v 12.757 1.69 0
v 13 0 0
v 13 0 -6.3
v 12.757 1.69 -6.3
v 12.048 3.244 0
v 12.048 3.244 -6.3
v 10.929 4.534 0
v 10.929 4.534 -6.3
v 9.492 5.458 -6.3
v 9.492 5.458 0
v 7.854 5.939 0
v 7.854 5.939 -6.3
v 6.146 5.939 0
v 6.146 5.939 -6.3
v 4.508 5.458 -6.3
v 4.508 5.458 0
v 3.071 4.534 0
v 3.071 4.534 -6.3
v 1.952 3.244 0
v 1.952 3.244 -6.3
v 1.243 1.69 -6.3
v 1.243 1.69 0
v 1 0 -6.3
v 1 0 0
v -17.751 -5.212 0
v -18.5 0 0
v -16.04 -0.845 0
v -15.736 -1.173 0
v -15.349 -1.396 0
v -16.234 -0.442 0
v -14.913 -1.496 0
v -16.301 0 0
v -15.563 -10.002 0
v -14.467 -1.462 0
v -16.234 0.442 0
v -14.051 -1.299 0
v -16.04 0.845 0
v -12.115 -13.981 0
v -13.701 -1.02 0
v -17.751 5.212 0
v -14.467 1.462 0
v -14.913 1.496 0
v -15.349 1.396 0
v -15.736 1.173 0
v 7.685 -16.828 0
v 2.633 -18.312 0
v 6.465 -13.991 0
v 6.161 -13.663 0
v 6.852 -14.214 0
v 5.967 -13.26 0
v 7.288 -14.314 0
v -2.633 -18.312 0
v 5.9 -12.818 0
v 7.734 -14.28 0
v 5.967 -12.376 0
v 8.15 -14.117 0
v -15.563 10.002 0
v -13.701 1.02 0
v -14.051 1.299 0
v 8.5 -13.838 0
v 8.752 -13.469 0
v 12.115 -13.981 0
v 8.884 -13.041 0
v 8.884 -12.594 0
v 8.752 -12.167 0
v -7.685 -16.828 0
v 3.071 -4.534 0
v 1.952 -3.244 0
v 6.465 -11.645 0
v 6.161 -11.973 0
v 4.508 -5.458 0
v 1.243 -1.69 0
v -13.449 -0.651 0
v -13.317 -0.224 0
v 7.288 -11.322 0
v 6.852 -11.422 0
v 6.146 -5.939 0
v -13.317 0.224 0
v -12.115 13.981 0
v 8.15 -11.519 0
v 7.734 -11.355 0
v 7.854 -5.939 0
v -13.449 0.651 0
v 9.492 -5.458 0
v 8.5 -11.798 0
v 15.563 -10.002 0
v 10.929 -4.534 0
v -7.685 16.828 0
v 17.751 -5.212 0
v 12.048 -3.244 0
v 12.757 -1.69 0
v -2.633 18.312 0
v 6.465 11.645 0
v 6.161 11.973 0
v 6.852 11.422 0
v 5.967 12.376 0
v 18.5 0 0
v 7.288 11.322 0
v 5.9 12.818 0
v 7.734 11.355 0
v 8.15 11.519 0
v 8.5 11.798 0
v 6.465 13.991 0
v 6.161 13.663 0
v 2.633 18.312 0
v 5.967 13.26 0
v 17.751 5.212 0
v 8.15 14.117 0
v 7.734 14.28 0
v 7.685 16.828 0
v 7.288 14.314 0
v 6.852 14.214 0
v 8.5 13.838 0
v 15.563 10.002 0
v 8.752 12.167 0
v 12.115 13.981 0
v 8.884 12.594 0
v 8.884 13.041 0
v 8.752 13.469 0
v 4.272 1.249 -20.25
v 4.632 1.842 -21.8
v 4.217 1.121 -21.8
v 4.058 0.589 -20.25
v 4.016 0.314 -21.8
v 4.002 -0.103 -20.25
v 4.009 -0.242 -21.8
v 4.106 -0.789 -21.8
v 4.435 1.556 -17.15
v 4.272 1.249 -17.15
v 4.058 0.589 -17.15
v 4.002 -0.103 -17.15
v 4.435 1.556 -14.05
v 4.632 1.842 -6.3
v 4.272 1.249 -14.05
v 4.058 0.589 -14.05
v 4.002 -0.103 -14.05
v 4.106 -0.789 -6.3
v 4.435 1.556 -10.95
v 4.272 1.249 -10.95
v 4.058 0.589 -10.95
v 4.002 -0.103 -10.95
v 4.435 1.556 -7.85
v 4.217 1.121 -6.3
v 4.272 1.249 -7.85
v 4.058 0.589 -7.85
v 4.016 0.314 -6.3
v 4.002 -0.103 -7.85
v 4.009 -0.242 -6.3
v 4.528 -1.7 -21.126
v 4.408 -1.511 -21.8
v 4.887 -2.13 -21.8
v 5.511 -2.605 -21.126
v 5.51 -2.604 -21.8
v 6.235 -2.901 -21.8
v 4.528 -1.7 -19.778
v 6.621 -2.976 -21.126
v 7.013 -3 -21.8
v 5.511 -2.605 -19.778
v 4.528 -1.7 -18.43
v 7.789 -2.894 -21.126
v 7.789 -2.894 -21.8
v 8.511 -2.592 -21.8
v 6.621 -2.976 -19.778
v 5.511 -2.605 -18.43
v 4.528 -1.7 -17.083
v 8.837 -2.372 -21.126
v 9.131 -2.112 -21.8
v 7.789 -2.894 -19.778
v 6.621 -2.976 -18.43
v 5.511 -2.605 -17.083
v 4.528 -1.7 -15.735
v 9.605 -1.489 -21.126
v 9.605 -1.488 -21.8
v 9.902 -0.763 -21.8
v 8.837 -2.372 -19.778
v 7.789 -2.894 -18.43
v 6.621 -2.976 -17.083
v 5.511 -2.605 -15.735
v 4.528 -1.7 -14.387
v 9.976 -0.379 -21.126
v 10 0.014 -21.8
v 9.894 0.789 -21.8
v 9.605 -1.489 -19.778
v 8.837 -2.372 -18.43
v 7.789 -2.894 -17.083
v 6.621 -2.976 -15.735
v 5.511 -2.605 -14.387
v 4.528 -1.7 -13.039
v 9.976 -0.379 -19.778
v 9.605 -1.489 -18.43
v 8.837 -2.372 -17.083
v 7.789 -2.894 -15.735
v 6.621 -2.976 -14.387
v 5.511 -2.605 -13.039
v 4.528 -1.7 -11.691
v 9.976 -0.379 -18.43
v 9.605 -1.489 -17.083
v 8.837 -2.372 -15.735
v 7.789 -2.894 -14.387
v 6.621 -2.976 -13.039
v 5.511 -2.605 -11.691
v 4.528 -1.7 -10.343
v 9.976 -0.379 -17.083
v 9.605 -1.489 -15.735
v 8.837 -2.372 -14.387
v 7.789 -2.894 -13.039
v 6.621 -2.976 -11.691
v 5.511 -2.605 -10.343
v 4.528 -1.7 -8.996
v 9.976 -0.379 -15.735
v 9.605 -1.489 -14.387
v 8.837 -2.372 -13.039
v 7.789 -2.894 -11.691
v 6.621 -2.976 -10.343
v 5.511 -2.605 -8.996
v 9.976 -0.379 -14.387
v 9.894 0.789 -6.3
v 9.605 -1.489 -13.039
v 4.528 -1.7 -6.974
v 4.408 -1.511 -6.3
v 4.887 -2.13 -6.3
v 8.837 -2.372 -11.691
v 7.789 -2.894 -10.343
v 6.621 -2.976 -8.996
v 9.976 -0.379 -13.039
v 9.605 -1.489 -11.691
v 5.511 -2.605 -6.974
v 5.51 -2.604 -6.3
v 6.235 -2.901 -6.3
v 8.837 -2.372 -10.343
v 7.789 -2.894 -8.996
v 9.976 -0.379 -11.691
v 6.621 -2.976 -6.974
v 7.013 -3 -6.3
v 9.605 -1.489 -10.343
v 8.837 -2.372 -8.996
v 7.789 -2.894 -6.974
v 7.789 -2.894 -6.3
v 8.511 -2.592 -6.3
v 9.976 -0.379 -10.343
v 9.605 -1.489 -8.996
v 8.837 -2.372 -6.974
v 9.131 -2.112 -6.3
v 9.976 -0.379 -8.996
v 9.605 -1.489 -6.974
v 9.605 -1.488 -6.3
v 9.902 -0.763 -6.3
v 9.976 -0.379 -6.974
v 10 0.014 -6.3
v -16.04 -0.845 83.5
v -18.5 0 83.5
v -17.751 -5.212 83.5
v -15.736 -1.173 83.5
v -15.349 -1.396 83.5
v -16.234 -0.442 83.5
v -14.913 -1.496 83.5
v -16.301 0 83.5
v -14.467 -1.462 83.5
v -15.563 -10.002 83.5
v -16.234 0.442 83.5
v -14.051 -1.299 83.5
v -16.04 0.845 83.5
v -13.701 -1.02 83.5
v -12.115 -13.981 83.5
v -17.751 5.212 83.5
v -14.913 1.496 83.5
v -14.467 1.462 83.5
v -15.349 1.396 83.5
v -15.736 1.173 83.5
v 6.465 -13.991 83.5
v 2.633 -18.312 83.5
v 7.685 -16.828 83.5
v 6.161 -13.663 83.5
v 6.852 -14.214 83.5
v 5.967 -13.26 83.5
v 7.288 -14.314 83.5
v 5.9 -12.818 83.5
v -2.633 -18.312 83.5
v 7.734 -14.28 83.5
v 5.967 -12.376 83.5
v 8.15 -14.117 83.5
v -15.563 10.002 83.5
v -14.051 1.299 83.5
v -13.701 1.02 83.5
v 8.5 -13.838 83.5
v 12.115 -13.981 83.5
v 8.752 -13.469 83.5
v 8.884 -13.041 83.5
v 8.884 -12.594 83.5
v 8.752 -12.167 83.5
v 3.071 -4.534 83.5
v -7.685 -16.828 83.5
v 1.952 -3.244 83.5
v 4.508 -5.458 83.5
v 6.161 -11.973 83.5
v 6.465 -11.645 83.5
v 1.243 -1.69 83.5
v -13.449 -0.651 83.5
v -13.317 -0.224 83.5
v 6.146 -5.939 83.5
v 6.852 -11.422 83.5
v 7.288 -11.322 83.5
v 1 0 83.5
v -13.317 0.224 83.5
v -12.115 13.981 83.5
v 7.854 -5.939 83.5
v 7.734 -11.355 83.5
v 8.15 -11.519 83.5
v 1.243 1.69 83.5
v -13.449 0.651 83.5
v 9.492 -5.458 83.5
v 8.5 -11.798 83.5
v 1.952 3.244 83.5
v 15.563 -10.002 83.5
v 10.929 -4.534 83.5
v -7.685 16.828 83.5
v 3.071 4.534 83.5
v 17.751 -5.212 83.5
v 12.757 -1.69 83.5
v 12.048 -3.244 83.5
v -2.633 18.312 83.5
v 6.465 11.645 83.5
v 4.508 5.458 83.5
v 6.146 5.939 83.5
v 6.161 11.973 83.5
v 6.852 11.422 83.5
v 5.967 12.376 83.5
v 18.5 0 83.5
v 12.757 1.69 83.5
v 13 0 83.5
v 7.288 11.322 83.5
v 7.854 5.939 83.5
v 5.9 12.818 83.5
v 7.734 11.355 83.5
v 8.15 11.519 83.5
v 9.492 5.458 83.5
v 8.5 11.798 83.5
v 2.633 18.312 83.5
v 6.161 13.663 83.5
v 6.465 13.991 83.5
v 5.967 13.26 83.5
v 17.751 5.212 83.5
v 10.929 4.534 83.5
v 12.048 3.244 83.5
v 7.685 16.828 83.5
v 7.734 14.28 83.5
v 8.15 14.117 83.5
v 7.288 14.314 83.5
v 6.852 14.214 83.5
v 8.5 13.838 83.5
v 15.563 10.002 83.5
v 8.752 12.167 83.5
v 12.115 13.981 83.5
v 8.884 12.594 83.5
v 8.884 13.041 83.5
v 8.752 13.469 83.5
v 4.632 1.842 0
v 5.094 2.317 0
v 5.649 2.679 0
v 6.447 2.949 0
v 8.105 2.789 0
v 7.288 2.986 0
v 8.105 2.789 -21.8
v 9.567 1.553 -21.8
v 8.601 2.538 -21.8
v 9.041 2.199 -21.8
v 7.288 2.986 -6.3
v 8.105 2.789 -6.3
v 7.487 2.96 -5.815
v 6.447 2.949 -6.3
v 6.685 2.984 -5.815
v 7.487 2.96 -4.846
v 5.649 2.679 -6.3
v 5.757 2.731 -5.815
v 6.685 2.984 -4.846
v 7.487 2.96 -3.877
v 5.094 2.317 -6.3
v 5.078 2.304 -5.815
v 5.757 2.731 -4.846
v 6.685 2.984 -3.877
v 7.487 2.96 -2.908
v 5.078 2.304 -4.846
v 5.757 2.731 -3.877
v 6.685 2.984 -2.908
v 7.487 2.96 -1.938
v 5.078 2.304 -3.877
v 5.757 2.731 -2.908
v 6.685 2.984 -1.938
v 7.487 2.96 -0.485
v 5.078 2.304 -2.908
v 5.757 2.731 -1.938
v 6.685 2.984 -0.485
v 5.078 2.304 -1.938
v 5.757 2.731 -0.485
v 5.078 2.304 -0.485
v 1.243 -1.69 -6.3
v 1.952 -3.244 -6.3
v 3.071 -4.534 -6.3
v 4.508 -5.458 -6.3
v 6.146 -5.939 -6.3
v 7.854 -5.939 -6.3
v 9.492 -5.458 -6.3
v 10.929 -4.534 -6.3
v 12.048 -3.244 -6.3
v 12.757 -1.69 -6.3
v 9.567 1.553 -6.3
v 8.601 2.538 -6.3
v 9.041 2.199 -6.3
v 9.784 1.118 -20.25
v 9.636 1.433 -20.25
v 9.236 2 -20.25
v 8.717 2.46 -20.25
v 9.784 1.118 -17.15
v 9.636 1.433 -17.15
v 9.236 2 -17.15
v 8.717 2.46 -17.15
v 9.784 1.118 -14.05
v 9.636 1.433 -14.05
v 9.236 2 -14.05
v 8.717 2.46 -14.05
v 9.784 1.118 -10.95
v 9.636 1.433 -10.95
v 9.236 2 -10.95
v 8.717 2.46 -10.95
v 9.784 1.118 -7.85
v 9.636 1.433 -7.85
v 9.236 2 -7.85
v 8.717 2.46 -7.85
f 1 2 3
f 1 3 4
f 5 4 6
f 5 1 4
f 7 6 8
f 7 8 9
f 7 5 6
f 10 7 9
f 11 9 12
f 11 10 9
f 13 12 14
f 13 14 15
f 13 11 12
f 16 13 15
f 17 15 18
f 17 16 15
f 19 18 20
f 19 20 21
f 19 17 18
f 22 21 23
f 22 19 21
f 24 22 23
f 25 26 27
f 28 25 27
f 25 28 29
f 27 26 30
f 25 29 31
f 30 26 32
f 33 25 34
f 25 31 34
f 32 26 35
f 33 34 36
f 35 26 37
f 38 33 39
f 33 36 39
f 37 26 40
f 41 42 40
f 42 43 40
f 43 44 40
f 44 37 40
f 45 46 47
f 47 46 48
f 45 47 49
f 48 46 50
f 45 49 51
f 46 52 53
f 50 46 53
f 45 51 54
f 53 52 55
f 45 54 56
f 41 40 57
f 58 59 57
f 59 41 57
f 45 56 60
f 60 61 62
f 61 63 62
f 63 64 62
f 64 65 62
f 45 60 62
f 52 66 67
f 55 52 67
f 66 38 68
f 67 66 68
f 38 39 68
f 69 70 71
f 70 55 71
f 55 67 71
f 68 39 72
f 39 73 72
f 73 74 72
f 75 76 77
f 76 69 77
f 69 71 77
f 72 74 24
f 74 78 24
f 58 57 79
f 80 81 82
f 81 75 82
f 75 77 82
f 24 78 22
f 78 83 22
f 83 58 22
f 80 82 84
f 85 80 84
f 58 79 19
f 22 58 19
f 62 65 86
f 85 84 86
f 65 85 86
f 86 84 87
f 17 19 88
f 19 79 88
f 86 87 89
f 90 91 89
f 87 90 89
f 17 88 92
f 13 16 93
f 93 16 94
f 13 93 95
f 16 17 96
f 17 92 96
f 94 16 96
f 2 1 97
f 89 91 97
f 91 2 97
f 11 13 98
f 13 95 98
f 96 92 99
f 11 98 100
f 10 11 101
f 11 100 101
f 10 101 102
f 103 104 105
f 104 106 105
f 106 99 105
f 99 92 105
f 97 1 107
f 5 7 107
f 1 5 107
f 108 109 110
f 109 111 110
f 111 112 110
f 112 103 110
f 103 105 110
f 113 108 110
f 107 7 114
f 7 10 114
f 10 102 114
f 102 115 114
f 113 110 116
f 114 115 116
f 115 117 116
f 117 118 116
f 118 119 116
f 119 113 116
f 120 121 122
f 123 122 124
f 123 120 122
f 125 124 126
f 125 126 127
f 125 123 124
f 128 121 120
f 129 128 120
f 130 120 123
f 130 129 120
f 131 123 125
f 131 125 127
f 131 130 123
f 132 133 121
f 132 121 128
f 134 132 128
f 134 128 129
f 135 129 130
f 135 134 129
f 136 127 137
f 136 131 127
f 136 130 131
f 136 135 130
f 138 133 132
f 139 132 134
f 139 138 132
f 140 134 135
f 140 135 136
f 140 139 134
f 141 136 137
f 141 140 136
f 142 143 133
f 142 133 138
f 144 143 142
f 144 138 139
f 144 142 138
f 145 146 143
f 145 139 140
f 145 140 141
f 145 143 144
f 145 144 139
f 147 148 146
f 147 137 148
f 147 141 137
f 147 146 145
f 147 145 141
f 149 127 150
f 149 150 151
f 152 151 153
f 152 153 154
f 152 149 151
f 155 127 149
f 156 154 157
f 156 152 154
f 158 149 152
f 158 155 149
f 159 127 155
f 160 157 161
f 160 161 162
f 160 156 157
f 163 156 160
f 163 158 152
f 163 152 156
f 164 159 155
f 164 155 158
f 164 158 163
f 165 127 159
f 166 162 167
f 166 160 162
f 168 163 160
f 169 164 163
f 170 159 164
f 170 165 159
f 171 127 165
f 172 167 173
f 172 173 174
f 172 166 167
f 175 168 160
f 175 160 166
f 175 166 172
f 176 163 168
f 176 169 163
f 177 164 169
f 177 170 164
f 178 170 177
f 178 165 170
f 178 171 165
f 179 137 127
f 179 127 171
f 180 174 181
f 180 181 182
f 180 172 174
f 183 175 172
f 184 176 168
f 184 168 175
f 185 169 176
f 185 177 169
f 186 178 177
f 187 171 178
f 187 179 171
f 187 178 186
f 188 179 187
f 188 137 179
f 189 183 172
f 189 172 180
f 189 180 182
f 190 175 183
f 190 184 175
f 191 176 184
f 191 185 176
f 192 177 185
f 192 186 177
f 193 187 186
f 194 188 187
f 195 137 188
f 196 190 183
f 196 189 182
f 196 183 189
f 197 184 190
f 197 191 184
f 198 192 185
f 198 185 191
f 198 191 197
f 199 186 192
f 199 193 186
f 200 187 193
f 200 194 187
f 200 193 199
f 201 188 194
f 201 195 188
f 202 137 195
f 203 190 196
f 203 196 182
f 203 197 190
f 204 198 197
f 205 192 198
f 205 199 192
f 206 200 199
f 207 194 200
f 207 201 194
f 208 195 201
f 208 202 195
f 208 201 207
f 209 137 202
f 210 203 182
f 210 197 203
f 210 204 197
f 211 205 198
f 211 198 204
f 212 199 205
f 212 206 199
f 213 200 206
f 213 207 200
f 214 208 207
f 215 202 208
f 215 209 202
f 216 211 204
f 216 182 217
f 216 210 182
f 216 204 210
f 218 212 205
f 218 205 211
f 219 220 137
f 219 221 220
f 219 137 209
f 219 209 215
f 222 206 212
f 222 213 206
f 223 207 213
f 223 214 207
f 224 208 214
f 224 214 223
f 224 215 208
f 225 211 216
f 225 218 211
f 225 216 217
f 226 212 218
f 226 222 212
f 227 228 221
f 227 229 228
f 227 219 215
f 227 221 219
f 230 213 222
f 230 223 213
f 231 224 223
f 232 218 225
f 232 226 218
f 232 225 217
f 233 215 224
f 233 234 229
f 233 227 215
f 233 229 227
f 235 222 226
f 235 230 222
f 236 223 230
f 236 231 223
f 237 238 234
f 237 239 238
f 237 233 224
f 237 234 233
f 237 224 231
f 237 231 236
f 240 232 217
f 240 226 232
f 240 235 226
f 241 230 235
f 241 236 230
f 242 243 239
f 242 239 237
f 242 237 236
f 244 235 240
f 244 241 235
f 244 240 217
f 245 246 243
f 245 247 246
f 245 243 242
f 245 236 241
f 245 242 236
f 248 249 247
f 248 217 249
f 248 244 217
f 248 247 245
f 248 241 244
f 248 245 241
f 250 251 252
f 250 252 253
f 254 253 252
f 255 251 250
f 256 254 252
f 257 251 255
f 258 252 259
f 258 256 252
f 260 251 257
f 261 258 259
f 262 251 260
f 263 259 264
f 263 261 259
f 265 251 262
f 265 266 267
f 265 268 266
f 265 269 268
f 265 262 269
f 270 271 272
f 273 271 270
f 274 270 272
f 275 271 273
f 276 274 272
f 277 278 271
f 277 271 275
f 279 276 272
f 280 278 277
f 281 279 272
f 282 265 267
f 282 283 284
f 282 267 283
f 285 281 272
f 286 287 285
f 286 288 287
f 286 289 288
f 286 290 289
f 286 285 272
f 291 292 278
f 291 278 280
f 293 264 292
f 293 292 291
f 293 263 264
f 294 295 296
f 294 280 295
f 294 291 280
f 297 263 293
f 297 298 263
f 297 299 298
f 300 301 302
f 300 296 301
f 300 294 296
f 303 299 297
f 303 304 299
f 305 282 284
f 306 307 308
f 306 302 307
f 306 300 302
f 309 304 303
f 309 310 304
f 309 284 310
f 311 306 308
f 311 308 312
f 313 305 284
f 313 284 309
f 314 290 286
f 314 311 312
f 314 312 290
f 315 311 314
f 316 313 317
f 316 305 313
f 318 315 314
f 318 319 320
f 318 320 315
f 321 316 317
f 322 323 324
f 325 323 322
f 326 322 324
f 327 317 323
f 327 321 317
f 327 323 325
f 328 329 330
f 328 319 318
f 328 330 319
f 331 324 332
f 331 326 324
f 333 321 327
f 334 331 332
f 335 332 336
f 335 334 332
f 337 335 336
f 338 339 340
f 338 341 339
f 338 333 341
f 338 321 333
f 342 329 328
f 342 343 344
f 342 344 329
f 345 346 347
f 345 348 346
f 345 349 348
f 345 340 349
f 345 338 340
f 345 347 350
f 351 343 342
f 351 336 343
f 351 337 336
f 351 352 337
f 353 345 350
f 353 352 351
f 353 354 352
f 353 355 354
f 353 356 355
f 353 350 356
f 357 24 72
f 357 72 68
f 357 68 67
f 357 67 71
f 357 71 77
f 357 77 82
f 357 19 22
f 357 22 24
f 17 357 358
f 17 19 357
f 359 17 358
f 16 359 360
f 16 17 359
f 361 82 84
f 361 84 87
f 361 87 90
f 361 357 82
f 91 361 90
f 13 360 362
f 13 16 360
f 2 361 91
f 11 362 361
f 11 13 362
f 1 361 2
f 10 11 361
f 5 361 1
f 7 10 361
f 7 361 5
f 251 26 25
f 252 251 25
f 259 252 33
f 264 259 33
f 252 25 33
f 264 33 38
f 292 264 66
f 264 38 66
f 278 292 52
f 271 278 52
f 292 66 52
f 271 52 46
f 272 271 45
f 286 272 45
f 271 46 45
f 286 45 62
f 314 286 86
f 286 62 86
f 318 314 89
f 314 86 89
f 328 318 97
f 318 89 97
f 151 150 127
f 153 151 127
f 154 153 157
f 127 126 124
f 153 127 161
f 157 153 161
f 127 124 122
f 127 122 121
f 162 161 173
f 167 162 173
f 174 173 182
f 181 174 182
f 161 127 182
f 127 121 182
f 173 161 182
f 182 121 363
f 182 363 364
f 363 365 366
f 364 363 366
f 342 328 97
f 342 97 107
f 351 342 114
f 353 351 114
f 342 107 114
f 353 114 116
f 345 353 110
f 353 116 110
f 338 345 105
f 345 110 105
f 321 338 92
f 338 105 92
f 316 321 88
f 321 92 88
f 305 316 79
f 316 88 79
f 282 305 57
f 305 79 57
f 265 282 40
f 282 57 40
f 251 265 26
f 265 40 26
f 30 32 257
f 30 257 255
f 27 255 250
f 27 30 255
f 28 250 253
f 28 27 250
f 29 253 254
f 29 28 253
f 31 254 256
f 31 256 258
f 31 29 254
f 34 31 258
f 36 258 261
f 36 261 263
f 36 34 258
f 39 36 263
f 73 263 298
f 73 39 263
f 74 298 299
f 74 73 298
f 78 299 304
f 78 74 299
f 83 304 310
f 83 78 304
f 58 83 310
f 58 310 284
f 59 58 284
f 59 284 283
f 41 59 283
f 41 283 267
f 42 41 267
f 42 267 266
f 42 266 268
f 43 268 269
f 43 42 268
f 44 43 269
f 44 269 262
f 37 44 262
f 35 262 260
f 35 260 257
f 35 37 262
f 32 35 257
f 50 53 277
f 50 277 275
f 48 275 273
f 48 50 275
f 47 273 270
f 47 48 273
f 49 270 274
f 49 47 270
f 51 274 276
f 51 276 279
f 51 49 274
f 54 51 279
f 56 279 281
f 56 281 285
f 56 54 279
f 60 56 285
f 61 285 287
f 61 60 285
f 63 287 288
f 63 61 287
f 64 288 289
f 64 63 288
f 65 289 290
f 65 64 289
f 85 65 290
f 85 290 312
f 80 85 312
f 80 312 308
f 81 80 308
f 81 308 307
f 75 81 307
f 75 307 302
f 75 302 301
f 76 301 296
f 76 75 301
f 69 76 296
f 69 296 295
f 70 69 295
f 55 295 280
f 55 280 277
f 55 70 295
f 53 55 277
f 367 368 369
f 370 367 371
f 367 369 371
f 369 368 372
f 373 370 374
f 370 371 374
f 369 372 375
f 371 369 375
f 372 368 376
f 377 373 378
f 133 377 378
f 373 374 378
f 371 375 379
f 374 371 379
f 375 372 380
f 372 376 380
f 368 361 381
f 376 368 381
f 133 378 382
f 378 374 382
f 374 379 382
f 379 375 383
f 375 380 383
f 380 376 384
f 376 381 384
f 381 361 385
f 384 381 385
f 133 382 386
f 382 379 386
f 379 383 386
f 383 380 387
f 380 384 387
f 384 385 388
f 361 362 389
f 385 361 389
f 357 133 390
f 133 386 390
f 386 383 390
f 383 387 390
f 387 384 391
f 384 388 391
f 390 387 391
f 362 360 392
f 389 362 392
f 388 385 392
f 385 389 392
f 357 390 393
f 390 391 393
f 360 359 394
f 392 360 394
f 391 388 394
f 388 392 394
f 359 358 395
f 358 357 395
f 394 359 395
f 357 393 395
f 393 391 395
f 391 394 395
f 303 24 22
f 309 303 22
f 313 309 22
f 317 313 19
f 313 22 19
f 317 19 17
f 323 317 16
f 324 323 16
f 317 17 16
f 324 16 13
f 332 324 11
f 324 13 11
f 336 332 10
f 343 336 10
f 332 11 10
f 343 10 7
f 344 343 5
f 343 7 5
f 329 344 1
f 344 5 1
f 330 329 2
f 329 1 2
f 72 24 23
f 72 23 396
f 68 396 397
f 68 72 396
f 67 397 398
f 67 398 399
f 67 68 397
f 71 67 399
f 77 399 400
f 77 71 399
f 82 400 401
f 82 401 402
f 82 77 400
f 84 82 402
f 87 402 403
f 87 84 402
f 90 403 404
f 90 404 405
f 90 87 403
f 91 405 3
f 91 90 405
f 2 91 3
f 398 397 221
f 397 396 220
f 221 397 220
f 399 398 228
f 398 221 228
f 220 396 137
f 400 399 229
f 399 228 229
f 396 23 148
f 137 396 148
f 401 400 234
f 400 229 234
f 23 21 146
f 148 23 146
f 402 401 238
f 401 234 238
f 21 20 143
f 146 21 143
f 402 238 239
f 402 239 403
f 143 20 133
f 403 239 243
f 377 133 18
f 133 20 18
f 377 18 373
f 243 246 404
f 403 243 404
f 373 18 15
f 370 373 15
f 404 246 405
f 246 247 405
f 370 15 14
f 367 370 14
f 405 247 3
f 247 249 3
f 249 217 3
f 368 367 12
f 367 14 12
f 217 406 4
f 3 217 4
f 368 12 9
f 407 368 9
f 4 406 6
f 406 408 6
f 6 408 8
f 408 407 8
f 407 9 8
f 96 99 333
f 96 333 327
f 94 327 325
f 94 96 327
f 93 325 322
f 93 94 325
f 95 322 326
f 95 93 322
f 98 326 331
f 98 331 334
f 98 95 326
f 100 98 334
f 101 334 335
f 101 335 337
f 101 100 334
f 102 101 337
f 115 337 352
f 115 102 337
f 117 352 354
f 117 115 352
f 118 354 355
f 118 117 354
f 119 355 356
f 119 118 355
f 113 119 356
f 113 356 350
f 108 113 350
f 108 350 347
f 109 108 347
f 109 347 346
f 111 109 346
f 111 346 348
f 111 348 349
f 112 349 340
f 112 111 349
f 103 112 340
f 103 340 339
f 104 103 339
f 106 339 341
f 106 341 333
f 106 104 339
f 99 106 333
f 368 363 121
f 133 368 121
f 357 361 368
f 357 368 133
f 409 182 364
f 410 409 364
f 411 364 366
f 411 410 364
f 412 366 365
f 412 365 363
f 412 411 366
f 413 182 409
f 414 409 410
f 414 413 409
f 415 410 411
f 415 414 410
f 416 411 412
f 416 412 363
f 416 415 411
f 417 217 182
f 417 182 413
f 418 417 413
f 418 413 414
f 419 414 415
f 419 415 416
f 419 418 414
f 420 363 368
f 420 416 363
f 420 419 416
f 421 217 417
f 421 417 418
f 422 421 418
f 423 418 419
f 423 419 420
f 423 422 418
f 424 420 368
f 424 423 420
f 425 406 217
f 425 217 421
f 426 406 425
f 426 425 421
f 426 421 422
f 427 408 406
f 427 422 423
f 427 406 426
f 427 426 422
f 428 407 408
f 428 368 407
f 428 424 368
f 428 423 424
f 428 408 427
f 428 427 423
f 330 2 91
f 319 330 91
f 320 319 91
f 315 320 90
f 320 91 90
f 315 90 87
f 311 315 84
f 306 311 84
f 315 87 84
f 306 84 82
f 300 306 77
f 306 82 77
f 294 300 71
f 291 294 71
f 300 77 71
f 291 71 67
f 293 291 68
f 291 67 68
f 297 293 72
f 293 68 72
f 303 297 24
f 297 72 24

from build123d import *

# Parameters (mm, degrees)
SKETCH1_R           = 1.5
BOSS_EXTRUDE1_DEPTH = 83.5
BOSS_EXTRUDE2_DEPTH = 6.3
BOSS_EXTRUDE3_DEPTH = 21.8


with BuildPart() as part:
    # Sketch1 → Boss-Extrude1 (new body)
    with BuildSketch(Plane.XY):
        with BuildLine():
            ThreePointArc((-18.5, -1e-09), (-1e-09, -18.500000001), (18.5, -4e-09))
            ThreePointArc((18.5, -4e-09), (1e-09, 18.499999998), (-18.5, -1e-09))
        make_face()
        with Locations(Location((7.400368446, -12.817814144, 0), (0, 0, 180))):
            Circle(SKETCH1_R, mode=Mode.SUBTRACT)
        with Locations(Location((-14.800736893, 0, 0), (0, 0, 180))):
            Circle(SKETCH1_R, mode=Mode.SUBTRACT)
        with BuildLine():
            ThreePointArc((13, -1e-09), (7, -6.000000001), (1, 0))
            ThreePointArc((1, 0), (7, 6), (13, -1e-09))
        make_face(mode=Mode.SUBTRACT)
        with Locations(Location((7.400368446, 12.817814144, 0), (0, 0, 180))):
            Circle(SKETCH1_R, mode=Mode.SUBTRACT)
    extrude(amount=BOSS_EXTRUDE1_DEPTH)


with BuildPart() as body_2:
    # Sketch1<4> → Boss-Extrude2 (new body)
    with BuildSketch(Plane.XY):
        with BuildLine():
            ThreePointArc((1, 0), (7, -6.000000001), (13, -1e-09))
            ThreePointArc((13, -1e-09), (7, 6), (1, 0))
        make_face()
        with BuildLine():
            add(Edge.make_bspline(
                [(8.10541894, 2.788921407), (8.05500552, 2.808017036), (7.954470645, 2.846097703), (7.800382794, 2.892843221), (7.644653105, 2.931666611), (7.487006952, 2.961856664), (7.327509508, 2.983596312), (7.060252278, 3.005571873), (6.68327869, 2.996823324), (6.207659642, 2.906637249), (5.752071024, 2.74292972), (5.375767864, 2.533132351), (5.075145817, 2.308378785), (4.837518217, 2.090132072), (4.700743618, 1.92494138), (4.632152753, 1.842100177)],
                knots=[0, 0, 0, 0, 0.041904133, 0.083565582, 0.125104396, 0.166641686, 0.208298579, 0.250195161, 0.375077662, 0.500044869, 0.624999105, 0.749894577, 0.833412578, 0.916458353, 1, 1, 1, 1], degree=3))
            add(Edge.make_bspline(
                [(4.632152753, 1.842100177), (4.597269985, 1.795687752), (4.527611903, 1.703024503), (4.433602806, 1.556735275), (4.347690797, 1.405616278), (4.245209228, 1.197641534), (4.139602727, 0.927062319), (4.05183773, 0.590024289), (4.003020314, 0.245060768), (3.995573118, -0.103006397), (4.02527969, -0.45047126), (4.078837212, -0.676165232), (4.105616921, -0.789016216)],
                knots=[0, 0, 0, 0, 0.062621871, 0.125034978, 0.187450303, 0.250078802, 0.375056772, 0.500052515, 0.625030485, 0.750026228, 0.875008686, 1, 1, 1, 1], degree=3))
            add(Edge.make_bspline(
                [(4.105616921, -0.789016216), (4.121346898, -0.843341546), (4.152683127, -0.95156491), (4.210842998, -1.109818013), (4.276905688, -1.263998492), (4.351672036, -1.413884276), (4.434920833, -1.559525946), (4.526726784, -1.700914361), (4.708992899, -1.950135671), (5.018399378, -2.279613745), (5.50192427, -2.620834329), (6.041515585, -2.864347025), (6.618933709, -2.994641949), (7.210607239, -3.013102901), (7.793942299, -2.912517343), (8.347639904, -2.703148265), (8.848078854, -2.386985144), (9.279508614, -1.981669651), (9.620855698, -1.498035987), (9.864366677, -0.958574348), (9.972979397, -0.476459302), (10.004050984, -0.084821691), (9.997819621, 0.209477257), (9.964166275, 0.502224345), (9.91771995, 0.693107384), (9.894383079, 0.789016217)],
                knots=[0, 0, 0, 0, 0.018019158, 0.035896586, 0.053688522, 0.071452014, 0.089244387, 0.107122684, 0.125143136, 0.187619424, 0.250101049, 0.312577337, 0.375058963, 0.437535251, 0.500016876, 0.562493163, 0.62497479, 0.687451077, 0.749932704, 0.812408993, 0.874890617, 0.906319787, 0.93744398, 0.968568842, 1, 1, 1, 1], degree=3))
            add(Edge.make_bspline(
                [(9.894383079, 0.789016217), (9.87818821, 0.844771359), (9.84585246, 0.956095774), (9.785226535, 1.119076588), (9.715878542, 1.278477594), (9.610987687, 1.485247696), (9.457888215, 1.732080426), (9.240916793, 2.004515242), (8.994236429, 2.250547291), (8.720251014, 2.465345345), (8.42445518, 2.650059005), (8.211765489, 2.742629371), (8.10541894, 2.788921407)],
                knots=[0, 0, 0, 0, 0.06262187, 0.125034977, 0.187450302, 0.250078803, 0.375056772, 0.500052515, 0.625030484, 0.750026228, 0.875008685, 1, 1, 1, 1], degree=3))
        make_face(mode=Mode.SUBTRACT)
    extrude(amount=-BOSS_EXTRUDE2_DEPTH)


with BuildPart() as boss_extrude3_tool:
    # Sketch1<5> → Boss-Extrude3 (new body)
    with BuildSketch(Plane.XY):
        with BuildLine():
            Line((8.105416875, 2.788916194), (4.632157178, 1.842096733))
            add(Edge.make_bspline(
                [(4.632157178, 1.842096733), (4.597269985, 1.795687752), (4.527611903, 1.703024503), (4.433602806, 1.556735275), (4.347690797, 1.405616278), (4.245209228, 1.197641534), (4.139602727, 0.927062319), (4.05183773, 0.590024289), (4.003020314, 0.245060768), (3.995573118, -0.103006397), (4.02527969, -0.45047126), (4.078837212, -0.676165232), (4.105616921, -0.789016216)],
                knots=[0, 0, 0, 0, 0.062621871, 0.125034978, 0.187450303, 0.250078802, 0.375056772, 0.500052515, 0.625030485, 0.750026228, 0.875008686, 1, 1, 1, 1], degree=3))
            add(Edge.make_bspline(
                [(4.105616921, -0.789016216), (4.121346898, -0.843341546), (4.152683127, -0.95156491), (4.210842998, -1.109818013), (4.276905688, -1.263998492), (4.351672036, -1.413884276), (4.434920833, -1.559525946), (4.526726784, -1.700914361), (4.708992899, -1.950135671), (5.018399378, -2.279613745), (5.50192427, -2.620834329), (6.041515585, -2.864347025), (6.618933709, -2.994641949), (7.210607239, -3.013102901), (7.793942299, -2.912517343), (8.347639904, -2.703148265), (8.848078854, -2.386985144), (9.279508614, -1.981669651), (9.620855698, -1.498035987), (9.864366677, -0.958574348), (9.972979397, -0.476459302), (10.004050984, -0.084821691), (9.997819621, 0.209477257), (9.964166275, 0.502224345), (9.91771995, 0.693107384), (9.894383079, 0.789016217)],
                knots=[0, 0, 0, 0, 0.018019158, 0.035896586, 0.053688522, 0.071452014, 0.089244387, 0.107122684, 0.125143136, 0.187619424, 0.250101049, 0.312577337, 0.375058963, 0.437535251, 0.500016876, 0.562493163, 0.62497479, 0.687451077, 0.749932704, 0.812408993, 0.874890617, 0.906319787, 0.93744398, 0.968568842, 1, 1, 1, 1], degree=3))
            add(Edge.make_bspline(
                [(9.894383079, 0.789016217), (9.87818821, 0.844771359), (9.84585246, 0.956095774), (9.785226535, 1.119076588), (9.715878542, 1.278477594), (9.610987687, 1.485247696), (9.457888215, 1.732080426), (9.240916793, 2.004515242), (8.994236429, 2.250547291), (8.720251014, 2.465345345), (8.42445518, 2.650059005), (8.211765489, 2.742629371), (8.105416875, 2.788916194)],
                knots=[0, 0, 0, 0, 0.06262187, 0.125034977, 0.187450302, 0.250078803, 0.375056772, 0.500052515, 0.625030484, 0.750026228, 0.875008685, 1, 1, 1, 1], degree=3))
        make_face()
    extrude(amount=-BOSS_EXTRUDE3_DEPTH)


with BuildPart() as body_2_1:
    add(body_2.part)


with BuildPart() as body_2_2:
    # Boss-Extrude3: joined with boss_extrude3_tool
    add(body_2_1.part.fuse(boss_extrude3_tool.part, tol=0.00001))


solid = Compound([part.part, body_2_2.part])
